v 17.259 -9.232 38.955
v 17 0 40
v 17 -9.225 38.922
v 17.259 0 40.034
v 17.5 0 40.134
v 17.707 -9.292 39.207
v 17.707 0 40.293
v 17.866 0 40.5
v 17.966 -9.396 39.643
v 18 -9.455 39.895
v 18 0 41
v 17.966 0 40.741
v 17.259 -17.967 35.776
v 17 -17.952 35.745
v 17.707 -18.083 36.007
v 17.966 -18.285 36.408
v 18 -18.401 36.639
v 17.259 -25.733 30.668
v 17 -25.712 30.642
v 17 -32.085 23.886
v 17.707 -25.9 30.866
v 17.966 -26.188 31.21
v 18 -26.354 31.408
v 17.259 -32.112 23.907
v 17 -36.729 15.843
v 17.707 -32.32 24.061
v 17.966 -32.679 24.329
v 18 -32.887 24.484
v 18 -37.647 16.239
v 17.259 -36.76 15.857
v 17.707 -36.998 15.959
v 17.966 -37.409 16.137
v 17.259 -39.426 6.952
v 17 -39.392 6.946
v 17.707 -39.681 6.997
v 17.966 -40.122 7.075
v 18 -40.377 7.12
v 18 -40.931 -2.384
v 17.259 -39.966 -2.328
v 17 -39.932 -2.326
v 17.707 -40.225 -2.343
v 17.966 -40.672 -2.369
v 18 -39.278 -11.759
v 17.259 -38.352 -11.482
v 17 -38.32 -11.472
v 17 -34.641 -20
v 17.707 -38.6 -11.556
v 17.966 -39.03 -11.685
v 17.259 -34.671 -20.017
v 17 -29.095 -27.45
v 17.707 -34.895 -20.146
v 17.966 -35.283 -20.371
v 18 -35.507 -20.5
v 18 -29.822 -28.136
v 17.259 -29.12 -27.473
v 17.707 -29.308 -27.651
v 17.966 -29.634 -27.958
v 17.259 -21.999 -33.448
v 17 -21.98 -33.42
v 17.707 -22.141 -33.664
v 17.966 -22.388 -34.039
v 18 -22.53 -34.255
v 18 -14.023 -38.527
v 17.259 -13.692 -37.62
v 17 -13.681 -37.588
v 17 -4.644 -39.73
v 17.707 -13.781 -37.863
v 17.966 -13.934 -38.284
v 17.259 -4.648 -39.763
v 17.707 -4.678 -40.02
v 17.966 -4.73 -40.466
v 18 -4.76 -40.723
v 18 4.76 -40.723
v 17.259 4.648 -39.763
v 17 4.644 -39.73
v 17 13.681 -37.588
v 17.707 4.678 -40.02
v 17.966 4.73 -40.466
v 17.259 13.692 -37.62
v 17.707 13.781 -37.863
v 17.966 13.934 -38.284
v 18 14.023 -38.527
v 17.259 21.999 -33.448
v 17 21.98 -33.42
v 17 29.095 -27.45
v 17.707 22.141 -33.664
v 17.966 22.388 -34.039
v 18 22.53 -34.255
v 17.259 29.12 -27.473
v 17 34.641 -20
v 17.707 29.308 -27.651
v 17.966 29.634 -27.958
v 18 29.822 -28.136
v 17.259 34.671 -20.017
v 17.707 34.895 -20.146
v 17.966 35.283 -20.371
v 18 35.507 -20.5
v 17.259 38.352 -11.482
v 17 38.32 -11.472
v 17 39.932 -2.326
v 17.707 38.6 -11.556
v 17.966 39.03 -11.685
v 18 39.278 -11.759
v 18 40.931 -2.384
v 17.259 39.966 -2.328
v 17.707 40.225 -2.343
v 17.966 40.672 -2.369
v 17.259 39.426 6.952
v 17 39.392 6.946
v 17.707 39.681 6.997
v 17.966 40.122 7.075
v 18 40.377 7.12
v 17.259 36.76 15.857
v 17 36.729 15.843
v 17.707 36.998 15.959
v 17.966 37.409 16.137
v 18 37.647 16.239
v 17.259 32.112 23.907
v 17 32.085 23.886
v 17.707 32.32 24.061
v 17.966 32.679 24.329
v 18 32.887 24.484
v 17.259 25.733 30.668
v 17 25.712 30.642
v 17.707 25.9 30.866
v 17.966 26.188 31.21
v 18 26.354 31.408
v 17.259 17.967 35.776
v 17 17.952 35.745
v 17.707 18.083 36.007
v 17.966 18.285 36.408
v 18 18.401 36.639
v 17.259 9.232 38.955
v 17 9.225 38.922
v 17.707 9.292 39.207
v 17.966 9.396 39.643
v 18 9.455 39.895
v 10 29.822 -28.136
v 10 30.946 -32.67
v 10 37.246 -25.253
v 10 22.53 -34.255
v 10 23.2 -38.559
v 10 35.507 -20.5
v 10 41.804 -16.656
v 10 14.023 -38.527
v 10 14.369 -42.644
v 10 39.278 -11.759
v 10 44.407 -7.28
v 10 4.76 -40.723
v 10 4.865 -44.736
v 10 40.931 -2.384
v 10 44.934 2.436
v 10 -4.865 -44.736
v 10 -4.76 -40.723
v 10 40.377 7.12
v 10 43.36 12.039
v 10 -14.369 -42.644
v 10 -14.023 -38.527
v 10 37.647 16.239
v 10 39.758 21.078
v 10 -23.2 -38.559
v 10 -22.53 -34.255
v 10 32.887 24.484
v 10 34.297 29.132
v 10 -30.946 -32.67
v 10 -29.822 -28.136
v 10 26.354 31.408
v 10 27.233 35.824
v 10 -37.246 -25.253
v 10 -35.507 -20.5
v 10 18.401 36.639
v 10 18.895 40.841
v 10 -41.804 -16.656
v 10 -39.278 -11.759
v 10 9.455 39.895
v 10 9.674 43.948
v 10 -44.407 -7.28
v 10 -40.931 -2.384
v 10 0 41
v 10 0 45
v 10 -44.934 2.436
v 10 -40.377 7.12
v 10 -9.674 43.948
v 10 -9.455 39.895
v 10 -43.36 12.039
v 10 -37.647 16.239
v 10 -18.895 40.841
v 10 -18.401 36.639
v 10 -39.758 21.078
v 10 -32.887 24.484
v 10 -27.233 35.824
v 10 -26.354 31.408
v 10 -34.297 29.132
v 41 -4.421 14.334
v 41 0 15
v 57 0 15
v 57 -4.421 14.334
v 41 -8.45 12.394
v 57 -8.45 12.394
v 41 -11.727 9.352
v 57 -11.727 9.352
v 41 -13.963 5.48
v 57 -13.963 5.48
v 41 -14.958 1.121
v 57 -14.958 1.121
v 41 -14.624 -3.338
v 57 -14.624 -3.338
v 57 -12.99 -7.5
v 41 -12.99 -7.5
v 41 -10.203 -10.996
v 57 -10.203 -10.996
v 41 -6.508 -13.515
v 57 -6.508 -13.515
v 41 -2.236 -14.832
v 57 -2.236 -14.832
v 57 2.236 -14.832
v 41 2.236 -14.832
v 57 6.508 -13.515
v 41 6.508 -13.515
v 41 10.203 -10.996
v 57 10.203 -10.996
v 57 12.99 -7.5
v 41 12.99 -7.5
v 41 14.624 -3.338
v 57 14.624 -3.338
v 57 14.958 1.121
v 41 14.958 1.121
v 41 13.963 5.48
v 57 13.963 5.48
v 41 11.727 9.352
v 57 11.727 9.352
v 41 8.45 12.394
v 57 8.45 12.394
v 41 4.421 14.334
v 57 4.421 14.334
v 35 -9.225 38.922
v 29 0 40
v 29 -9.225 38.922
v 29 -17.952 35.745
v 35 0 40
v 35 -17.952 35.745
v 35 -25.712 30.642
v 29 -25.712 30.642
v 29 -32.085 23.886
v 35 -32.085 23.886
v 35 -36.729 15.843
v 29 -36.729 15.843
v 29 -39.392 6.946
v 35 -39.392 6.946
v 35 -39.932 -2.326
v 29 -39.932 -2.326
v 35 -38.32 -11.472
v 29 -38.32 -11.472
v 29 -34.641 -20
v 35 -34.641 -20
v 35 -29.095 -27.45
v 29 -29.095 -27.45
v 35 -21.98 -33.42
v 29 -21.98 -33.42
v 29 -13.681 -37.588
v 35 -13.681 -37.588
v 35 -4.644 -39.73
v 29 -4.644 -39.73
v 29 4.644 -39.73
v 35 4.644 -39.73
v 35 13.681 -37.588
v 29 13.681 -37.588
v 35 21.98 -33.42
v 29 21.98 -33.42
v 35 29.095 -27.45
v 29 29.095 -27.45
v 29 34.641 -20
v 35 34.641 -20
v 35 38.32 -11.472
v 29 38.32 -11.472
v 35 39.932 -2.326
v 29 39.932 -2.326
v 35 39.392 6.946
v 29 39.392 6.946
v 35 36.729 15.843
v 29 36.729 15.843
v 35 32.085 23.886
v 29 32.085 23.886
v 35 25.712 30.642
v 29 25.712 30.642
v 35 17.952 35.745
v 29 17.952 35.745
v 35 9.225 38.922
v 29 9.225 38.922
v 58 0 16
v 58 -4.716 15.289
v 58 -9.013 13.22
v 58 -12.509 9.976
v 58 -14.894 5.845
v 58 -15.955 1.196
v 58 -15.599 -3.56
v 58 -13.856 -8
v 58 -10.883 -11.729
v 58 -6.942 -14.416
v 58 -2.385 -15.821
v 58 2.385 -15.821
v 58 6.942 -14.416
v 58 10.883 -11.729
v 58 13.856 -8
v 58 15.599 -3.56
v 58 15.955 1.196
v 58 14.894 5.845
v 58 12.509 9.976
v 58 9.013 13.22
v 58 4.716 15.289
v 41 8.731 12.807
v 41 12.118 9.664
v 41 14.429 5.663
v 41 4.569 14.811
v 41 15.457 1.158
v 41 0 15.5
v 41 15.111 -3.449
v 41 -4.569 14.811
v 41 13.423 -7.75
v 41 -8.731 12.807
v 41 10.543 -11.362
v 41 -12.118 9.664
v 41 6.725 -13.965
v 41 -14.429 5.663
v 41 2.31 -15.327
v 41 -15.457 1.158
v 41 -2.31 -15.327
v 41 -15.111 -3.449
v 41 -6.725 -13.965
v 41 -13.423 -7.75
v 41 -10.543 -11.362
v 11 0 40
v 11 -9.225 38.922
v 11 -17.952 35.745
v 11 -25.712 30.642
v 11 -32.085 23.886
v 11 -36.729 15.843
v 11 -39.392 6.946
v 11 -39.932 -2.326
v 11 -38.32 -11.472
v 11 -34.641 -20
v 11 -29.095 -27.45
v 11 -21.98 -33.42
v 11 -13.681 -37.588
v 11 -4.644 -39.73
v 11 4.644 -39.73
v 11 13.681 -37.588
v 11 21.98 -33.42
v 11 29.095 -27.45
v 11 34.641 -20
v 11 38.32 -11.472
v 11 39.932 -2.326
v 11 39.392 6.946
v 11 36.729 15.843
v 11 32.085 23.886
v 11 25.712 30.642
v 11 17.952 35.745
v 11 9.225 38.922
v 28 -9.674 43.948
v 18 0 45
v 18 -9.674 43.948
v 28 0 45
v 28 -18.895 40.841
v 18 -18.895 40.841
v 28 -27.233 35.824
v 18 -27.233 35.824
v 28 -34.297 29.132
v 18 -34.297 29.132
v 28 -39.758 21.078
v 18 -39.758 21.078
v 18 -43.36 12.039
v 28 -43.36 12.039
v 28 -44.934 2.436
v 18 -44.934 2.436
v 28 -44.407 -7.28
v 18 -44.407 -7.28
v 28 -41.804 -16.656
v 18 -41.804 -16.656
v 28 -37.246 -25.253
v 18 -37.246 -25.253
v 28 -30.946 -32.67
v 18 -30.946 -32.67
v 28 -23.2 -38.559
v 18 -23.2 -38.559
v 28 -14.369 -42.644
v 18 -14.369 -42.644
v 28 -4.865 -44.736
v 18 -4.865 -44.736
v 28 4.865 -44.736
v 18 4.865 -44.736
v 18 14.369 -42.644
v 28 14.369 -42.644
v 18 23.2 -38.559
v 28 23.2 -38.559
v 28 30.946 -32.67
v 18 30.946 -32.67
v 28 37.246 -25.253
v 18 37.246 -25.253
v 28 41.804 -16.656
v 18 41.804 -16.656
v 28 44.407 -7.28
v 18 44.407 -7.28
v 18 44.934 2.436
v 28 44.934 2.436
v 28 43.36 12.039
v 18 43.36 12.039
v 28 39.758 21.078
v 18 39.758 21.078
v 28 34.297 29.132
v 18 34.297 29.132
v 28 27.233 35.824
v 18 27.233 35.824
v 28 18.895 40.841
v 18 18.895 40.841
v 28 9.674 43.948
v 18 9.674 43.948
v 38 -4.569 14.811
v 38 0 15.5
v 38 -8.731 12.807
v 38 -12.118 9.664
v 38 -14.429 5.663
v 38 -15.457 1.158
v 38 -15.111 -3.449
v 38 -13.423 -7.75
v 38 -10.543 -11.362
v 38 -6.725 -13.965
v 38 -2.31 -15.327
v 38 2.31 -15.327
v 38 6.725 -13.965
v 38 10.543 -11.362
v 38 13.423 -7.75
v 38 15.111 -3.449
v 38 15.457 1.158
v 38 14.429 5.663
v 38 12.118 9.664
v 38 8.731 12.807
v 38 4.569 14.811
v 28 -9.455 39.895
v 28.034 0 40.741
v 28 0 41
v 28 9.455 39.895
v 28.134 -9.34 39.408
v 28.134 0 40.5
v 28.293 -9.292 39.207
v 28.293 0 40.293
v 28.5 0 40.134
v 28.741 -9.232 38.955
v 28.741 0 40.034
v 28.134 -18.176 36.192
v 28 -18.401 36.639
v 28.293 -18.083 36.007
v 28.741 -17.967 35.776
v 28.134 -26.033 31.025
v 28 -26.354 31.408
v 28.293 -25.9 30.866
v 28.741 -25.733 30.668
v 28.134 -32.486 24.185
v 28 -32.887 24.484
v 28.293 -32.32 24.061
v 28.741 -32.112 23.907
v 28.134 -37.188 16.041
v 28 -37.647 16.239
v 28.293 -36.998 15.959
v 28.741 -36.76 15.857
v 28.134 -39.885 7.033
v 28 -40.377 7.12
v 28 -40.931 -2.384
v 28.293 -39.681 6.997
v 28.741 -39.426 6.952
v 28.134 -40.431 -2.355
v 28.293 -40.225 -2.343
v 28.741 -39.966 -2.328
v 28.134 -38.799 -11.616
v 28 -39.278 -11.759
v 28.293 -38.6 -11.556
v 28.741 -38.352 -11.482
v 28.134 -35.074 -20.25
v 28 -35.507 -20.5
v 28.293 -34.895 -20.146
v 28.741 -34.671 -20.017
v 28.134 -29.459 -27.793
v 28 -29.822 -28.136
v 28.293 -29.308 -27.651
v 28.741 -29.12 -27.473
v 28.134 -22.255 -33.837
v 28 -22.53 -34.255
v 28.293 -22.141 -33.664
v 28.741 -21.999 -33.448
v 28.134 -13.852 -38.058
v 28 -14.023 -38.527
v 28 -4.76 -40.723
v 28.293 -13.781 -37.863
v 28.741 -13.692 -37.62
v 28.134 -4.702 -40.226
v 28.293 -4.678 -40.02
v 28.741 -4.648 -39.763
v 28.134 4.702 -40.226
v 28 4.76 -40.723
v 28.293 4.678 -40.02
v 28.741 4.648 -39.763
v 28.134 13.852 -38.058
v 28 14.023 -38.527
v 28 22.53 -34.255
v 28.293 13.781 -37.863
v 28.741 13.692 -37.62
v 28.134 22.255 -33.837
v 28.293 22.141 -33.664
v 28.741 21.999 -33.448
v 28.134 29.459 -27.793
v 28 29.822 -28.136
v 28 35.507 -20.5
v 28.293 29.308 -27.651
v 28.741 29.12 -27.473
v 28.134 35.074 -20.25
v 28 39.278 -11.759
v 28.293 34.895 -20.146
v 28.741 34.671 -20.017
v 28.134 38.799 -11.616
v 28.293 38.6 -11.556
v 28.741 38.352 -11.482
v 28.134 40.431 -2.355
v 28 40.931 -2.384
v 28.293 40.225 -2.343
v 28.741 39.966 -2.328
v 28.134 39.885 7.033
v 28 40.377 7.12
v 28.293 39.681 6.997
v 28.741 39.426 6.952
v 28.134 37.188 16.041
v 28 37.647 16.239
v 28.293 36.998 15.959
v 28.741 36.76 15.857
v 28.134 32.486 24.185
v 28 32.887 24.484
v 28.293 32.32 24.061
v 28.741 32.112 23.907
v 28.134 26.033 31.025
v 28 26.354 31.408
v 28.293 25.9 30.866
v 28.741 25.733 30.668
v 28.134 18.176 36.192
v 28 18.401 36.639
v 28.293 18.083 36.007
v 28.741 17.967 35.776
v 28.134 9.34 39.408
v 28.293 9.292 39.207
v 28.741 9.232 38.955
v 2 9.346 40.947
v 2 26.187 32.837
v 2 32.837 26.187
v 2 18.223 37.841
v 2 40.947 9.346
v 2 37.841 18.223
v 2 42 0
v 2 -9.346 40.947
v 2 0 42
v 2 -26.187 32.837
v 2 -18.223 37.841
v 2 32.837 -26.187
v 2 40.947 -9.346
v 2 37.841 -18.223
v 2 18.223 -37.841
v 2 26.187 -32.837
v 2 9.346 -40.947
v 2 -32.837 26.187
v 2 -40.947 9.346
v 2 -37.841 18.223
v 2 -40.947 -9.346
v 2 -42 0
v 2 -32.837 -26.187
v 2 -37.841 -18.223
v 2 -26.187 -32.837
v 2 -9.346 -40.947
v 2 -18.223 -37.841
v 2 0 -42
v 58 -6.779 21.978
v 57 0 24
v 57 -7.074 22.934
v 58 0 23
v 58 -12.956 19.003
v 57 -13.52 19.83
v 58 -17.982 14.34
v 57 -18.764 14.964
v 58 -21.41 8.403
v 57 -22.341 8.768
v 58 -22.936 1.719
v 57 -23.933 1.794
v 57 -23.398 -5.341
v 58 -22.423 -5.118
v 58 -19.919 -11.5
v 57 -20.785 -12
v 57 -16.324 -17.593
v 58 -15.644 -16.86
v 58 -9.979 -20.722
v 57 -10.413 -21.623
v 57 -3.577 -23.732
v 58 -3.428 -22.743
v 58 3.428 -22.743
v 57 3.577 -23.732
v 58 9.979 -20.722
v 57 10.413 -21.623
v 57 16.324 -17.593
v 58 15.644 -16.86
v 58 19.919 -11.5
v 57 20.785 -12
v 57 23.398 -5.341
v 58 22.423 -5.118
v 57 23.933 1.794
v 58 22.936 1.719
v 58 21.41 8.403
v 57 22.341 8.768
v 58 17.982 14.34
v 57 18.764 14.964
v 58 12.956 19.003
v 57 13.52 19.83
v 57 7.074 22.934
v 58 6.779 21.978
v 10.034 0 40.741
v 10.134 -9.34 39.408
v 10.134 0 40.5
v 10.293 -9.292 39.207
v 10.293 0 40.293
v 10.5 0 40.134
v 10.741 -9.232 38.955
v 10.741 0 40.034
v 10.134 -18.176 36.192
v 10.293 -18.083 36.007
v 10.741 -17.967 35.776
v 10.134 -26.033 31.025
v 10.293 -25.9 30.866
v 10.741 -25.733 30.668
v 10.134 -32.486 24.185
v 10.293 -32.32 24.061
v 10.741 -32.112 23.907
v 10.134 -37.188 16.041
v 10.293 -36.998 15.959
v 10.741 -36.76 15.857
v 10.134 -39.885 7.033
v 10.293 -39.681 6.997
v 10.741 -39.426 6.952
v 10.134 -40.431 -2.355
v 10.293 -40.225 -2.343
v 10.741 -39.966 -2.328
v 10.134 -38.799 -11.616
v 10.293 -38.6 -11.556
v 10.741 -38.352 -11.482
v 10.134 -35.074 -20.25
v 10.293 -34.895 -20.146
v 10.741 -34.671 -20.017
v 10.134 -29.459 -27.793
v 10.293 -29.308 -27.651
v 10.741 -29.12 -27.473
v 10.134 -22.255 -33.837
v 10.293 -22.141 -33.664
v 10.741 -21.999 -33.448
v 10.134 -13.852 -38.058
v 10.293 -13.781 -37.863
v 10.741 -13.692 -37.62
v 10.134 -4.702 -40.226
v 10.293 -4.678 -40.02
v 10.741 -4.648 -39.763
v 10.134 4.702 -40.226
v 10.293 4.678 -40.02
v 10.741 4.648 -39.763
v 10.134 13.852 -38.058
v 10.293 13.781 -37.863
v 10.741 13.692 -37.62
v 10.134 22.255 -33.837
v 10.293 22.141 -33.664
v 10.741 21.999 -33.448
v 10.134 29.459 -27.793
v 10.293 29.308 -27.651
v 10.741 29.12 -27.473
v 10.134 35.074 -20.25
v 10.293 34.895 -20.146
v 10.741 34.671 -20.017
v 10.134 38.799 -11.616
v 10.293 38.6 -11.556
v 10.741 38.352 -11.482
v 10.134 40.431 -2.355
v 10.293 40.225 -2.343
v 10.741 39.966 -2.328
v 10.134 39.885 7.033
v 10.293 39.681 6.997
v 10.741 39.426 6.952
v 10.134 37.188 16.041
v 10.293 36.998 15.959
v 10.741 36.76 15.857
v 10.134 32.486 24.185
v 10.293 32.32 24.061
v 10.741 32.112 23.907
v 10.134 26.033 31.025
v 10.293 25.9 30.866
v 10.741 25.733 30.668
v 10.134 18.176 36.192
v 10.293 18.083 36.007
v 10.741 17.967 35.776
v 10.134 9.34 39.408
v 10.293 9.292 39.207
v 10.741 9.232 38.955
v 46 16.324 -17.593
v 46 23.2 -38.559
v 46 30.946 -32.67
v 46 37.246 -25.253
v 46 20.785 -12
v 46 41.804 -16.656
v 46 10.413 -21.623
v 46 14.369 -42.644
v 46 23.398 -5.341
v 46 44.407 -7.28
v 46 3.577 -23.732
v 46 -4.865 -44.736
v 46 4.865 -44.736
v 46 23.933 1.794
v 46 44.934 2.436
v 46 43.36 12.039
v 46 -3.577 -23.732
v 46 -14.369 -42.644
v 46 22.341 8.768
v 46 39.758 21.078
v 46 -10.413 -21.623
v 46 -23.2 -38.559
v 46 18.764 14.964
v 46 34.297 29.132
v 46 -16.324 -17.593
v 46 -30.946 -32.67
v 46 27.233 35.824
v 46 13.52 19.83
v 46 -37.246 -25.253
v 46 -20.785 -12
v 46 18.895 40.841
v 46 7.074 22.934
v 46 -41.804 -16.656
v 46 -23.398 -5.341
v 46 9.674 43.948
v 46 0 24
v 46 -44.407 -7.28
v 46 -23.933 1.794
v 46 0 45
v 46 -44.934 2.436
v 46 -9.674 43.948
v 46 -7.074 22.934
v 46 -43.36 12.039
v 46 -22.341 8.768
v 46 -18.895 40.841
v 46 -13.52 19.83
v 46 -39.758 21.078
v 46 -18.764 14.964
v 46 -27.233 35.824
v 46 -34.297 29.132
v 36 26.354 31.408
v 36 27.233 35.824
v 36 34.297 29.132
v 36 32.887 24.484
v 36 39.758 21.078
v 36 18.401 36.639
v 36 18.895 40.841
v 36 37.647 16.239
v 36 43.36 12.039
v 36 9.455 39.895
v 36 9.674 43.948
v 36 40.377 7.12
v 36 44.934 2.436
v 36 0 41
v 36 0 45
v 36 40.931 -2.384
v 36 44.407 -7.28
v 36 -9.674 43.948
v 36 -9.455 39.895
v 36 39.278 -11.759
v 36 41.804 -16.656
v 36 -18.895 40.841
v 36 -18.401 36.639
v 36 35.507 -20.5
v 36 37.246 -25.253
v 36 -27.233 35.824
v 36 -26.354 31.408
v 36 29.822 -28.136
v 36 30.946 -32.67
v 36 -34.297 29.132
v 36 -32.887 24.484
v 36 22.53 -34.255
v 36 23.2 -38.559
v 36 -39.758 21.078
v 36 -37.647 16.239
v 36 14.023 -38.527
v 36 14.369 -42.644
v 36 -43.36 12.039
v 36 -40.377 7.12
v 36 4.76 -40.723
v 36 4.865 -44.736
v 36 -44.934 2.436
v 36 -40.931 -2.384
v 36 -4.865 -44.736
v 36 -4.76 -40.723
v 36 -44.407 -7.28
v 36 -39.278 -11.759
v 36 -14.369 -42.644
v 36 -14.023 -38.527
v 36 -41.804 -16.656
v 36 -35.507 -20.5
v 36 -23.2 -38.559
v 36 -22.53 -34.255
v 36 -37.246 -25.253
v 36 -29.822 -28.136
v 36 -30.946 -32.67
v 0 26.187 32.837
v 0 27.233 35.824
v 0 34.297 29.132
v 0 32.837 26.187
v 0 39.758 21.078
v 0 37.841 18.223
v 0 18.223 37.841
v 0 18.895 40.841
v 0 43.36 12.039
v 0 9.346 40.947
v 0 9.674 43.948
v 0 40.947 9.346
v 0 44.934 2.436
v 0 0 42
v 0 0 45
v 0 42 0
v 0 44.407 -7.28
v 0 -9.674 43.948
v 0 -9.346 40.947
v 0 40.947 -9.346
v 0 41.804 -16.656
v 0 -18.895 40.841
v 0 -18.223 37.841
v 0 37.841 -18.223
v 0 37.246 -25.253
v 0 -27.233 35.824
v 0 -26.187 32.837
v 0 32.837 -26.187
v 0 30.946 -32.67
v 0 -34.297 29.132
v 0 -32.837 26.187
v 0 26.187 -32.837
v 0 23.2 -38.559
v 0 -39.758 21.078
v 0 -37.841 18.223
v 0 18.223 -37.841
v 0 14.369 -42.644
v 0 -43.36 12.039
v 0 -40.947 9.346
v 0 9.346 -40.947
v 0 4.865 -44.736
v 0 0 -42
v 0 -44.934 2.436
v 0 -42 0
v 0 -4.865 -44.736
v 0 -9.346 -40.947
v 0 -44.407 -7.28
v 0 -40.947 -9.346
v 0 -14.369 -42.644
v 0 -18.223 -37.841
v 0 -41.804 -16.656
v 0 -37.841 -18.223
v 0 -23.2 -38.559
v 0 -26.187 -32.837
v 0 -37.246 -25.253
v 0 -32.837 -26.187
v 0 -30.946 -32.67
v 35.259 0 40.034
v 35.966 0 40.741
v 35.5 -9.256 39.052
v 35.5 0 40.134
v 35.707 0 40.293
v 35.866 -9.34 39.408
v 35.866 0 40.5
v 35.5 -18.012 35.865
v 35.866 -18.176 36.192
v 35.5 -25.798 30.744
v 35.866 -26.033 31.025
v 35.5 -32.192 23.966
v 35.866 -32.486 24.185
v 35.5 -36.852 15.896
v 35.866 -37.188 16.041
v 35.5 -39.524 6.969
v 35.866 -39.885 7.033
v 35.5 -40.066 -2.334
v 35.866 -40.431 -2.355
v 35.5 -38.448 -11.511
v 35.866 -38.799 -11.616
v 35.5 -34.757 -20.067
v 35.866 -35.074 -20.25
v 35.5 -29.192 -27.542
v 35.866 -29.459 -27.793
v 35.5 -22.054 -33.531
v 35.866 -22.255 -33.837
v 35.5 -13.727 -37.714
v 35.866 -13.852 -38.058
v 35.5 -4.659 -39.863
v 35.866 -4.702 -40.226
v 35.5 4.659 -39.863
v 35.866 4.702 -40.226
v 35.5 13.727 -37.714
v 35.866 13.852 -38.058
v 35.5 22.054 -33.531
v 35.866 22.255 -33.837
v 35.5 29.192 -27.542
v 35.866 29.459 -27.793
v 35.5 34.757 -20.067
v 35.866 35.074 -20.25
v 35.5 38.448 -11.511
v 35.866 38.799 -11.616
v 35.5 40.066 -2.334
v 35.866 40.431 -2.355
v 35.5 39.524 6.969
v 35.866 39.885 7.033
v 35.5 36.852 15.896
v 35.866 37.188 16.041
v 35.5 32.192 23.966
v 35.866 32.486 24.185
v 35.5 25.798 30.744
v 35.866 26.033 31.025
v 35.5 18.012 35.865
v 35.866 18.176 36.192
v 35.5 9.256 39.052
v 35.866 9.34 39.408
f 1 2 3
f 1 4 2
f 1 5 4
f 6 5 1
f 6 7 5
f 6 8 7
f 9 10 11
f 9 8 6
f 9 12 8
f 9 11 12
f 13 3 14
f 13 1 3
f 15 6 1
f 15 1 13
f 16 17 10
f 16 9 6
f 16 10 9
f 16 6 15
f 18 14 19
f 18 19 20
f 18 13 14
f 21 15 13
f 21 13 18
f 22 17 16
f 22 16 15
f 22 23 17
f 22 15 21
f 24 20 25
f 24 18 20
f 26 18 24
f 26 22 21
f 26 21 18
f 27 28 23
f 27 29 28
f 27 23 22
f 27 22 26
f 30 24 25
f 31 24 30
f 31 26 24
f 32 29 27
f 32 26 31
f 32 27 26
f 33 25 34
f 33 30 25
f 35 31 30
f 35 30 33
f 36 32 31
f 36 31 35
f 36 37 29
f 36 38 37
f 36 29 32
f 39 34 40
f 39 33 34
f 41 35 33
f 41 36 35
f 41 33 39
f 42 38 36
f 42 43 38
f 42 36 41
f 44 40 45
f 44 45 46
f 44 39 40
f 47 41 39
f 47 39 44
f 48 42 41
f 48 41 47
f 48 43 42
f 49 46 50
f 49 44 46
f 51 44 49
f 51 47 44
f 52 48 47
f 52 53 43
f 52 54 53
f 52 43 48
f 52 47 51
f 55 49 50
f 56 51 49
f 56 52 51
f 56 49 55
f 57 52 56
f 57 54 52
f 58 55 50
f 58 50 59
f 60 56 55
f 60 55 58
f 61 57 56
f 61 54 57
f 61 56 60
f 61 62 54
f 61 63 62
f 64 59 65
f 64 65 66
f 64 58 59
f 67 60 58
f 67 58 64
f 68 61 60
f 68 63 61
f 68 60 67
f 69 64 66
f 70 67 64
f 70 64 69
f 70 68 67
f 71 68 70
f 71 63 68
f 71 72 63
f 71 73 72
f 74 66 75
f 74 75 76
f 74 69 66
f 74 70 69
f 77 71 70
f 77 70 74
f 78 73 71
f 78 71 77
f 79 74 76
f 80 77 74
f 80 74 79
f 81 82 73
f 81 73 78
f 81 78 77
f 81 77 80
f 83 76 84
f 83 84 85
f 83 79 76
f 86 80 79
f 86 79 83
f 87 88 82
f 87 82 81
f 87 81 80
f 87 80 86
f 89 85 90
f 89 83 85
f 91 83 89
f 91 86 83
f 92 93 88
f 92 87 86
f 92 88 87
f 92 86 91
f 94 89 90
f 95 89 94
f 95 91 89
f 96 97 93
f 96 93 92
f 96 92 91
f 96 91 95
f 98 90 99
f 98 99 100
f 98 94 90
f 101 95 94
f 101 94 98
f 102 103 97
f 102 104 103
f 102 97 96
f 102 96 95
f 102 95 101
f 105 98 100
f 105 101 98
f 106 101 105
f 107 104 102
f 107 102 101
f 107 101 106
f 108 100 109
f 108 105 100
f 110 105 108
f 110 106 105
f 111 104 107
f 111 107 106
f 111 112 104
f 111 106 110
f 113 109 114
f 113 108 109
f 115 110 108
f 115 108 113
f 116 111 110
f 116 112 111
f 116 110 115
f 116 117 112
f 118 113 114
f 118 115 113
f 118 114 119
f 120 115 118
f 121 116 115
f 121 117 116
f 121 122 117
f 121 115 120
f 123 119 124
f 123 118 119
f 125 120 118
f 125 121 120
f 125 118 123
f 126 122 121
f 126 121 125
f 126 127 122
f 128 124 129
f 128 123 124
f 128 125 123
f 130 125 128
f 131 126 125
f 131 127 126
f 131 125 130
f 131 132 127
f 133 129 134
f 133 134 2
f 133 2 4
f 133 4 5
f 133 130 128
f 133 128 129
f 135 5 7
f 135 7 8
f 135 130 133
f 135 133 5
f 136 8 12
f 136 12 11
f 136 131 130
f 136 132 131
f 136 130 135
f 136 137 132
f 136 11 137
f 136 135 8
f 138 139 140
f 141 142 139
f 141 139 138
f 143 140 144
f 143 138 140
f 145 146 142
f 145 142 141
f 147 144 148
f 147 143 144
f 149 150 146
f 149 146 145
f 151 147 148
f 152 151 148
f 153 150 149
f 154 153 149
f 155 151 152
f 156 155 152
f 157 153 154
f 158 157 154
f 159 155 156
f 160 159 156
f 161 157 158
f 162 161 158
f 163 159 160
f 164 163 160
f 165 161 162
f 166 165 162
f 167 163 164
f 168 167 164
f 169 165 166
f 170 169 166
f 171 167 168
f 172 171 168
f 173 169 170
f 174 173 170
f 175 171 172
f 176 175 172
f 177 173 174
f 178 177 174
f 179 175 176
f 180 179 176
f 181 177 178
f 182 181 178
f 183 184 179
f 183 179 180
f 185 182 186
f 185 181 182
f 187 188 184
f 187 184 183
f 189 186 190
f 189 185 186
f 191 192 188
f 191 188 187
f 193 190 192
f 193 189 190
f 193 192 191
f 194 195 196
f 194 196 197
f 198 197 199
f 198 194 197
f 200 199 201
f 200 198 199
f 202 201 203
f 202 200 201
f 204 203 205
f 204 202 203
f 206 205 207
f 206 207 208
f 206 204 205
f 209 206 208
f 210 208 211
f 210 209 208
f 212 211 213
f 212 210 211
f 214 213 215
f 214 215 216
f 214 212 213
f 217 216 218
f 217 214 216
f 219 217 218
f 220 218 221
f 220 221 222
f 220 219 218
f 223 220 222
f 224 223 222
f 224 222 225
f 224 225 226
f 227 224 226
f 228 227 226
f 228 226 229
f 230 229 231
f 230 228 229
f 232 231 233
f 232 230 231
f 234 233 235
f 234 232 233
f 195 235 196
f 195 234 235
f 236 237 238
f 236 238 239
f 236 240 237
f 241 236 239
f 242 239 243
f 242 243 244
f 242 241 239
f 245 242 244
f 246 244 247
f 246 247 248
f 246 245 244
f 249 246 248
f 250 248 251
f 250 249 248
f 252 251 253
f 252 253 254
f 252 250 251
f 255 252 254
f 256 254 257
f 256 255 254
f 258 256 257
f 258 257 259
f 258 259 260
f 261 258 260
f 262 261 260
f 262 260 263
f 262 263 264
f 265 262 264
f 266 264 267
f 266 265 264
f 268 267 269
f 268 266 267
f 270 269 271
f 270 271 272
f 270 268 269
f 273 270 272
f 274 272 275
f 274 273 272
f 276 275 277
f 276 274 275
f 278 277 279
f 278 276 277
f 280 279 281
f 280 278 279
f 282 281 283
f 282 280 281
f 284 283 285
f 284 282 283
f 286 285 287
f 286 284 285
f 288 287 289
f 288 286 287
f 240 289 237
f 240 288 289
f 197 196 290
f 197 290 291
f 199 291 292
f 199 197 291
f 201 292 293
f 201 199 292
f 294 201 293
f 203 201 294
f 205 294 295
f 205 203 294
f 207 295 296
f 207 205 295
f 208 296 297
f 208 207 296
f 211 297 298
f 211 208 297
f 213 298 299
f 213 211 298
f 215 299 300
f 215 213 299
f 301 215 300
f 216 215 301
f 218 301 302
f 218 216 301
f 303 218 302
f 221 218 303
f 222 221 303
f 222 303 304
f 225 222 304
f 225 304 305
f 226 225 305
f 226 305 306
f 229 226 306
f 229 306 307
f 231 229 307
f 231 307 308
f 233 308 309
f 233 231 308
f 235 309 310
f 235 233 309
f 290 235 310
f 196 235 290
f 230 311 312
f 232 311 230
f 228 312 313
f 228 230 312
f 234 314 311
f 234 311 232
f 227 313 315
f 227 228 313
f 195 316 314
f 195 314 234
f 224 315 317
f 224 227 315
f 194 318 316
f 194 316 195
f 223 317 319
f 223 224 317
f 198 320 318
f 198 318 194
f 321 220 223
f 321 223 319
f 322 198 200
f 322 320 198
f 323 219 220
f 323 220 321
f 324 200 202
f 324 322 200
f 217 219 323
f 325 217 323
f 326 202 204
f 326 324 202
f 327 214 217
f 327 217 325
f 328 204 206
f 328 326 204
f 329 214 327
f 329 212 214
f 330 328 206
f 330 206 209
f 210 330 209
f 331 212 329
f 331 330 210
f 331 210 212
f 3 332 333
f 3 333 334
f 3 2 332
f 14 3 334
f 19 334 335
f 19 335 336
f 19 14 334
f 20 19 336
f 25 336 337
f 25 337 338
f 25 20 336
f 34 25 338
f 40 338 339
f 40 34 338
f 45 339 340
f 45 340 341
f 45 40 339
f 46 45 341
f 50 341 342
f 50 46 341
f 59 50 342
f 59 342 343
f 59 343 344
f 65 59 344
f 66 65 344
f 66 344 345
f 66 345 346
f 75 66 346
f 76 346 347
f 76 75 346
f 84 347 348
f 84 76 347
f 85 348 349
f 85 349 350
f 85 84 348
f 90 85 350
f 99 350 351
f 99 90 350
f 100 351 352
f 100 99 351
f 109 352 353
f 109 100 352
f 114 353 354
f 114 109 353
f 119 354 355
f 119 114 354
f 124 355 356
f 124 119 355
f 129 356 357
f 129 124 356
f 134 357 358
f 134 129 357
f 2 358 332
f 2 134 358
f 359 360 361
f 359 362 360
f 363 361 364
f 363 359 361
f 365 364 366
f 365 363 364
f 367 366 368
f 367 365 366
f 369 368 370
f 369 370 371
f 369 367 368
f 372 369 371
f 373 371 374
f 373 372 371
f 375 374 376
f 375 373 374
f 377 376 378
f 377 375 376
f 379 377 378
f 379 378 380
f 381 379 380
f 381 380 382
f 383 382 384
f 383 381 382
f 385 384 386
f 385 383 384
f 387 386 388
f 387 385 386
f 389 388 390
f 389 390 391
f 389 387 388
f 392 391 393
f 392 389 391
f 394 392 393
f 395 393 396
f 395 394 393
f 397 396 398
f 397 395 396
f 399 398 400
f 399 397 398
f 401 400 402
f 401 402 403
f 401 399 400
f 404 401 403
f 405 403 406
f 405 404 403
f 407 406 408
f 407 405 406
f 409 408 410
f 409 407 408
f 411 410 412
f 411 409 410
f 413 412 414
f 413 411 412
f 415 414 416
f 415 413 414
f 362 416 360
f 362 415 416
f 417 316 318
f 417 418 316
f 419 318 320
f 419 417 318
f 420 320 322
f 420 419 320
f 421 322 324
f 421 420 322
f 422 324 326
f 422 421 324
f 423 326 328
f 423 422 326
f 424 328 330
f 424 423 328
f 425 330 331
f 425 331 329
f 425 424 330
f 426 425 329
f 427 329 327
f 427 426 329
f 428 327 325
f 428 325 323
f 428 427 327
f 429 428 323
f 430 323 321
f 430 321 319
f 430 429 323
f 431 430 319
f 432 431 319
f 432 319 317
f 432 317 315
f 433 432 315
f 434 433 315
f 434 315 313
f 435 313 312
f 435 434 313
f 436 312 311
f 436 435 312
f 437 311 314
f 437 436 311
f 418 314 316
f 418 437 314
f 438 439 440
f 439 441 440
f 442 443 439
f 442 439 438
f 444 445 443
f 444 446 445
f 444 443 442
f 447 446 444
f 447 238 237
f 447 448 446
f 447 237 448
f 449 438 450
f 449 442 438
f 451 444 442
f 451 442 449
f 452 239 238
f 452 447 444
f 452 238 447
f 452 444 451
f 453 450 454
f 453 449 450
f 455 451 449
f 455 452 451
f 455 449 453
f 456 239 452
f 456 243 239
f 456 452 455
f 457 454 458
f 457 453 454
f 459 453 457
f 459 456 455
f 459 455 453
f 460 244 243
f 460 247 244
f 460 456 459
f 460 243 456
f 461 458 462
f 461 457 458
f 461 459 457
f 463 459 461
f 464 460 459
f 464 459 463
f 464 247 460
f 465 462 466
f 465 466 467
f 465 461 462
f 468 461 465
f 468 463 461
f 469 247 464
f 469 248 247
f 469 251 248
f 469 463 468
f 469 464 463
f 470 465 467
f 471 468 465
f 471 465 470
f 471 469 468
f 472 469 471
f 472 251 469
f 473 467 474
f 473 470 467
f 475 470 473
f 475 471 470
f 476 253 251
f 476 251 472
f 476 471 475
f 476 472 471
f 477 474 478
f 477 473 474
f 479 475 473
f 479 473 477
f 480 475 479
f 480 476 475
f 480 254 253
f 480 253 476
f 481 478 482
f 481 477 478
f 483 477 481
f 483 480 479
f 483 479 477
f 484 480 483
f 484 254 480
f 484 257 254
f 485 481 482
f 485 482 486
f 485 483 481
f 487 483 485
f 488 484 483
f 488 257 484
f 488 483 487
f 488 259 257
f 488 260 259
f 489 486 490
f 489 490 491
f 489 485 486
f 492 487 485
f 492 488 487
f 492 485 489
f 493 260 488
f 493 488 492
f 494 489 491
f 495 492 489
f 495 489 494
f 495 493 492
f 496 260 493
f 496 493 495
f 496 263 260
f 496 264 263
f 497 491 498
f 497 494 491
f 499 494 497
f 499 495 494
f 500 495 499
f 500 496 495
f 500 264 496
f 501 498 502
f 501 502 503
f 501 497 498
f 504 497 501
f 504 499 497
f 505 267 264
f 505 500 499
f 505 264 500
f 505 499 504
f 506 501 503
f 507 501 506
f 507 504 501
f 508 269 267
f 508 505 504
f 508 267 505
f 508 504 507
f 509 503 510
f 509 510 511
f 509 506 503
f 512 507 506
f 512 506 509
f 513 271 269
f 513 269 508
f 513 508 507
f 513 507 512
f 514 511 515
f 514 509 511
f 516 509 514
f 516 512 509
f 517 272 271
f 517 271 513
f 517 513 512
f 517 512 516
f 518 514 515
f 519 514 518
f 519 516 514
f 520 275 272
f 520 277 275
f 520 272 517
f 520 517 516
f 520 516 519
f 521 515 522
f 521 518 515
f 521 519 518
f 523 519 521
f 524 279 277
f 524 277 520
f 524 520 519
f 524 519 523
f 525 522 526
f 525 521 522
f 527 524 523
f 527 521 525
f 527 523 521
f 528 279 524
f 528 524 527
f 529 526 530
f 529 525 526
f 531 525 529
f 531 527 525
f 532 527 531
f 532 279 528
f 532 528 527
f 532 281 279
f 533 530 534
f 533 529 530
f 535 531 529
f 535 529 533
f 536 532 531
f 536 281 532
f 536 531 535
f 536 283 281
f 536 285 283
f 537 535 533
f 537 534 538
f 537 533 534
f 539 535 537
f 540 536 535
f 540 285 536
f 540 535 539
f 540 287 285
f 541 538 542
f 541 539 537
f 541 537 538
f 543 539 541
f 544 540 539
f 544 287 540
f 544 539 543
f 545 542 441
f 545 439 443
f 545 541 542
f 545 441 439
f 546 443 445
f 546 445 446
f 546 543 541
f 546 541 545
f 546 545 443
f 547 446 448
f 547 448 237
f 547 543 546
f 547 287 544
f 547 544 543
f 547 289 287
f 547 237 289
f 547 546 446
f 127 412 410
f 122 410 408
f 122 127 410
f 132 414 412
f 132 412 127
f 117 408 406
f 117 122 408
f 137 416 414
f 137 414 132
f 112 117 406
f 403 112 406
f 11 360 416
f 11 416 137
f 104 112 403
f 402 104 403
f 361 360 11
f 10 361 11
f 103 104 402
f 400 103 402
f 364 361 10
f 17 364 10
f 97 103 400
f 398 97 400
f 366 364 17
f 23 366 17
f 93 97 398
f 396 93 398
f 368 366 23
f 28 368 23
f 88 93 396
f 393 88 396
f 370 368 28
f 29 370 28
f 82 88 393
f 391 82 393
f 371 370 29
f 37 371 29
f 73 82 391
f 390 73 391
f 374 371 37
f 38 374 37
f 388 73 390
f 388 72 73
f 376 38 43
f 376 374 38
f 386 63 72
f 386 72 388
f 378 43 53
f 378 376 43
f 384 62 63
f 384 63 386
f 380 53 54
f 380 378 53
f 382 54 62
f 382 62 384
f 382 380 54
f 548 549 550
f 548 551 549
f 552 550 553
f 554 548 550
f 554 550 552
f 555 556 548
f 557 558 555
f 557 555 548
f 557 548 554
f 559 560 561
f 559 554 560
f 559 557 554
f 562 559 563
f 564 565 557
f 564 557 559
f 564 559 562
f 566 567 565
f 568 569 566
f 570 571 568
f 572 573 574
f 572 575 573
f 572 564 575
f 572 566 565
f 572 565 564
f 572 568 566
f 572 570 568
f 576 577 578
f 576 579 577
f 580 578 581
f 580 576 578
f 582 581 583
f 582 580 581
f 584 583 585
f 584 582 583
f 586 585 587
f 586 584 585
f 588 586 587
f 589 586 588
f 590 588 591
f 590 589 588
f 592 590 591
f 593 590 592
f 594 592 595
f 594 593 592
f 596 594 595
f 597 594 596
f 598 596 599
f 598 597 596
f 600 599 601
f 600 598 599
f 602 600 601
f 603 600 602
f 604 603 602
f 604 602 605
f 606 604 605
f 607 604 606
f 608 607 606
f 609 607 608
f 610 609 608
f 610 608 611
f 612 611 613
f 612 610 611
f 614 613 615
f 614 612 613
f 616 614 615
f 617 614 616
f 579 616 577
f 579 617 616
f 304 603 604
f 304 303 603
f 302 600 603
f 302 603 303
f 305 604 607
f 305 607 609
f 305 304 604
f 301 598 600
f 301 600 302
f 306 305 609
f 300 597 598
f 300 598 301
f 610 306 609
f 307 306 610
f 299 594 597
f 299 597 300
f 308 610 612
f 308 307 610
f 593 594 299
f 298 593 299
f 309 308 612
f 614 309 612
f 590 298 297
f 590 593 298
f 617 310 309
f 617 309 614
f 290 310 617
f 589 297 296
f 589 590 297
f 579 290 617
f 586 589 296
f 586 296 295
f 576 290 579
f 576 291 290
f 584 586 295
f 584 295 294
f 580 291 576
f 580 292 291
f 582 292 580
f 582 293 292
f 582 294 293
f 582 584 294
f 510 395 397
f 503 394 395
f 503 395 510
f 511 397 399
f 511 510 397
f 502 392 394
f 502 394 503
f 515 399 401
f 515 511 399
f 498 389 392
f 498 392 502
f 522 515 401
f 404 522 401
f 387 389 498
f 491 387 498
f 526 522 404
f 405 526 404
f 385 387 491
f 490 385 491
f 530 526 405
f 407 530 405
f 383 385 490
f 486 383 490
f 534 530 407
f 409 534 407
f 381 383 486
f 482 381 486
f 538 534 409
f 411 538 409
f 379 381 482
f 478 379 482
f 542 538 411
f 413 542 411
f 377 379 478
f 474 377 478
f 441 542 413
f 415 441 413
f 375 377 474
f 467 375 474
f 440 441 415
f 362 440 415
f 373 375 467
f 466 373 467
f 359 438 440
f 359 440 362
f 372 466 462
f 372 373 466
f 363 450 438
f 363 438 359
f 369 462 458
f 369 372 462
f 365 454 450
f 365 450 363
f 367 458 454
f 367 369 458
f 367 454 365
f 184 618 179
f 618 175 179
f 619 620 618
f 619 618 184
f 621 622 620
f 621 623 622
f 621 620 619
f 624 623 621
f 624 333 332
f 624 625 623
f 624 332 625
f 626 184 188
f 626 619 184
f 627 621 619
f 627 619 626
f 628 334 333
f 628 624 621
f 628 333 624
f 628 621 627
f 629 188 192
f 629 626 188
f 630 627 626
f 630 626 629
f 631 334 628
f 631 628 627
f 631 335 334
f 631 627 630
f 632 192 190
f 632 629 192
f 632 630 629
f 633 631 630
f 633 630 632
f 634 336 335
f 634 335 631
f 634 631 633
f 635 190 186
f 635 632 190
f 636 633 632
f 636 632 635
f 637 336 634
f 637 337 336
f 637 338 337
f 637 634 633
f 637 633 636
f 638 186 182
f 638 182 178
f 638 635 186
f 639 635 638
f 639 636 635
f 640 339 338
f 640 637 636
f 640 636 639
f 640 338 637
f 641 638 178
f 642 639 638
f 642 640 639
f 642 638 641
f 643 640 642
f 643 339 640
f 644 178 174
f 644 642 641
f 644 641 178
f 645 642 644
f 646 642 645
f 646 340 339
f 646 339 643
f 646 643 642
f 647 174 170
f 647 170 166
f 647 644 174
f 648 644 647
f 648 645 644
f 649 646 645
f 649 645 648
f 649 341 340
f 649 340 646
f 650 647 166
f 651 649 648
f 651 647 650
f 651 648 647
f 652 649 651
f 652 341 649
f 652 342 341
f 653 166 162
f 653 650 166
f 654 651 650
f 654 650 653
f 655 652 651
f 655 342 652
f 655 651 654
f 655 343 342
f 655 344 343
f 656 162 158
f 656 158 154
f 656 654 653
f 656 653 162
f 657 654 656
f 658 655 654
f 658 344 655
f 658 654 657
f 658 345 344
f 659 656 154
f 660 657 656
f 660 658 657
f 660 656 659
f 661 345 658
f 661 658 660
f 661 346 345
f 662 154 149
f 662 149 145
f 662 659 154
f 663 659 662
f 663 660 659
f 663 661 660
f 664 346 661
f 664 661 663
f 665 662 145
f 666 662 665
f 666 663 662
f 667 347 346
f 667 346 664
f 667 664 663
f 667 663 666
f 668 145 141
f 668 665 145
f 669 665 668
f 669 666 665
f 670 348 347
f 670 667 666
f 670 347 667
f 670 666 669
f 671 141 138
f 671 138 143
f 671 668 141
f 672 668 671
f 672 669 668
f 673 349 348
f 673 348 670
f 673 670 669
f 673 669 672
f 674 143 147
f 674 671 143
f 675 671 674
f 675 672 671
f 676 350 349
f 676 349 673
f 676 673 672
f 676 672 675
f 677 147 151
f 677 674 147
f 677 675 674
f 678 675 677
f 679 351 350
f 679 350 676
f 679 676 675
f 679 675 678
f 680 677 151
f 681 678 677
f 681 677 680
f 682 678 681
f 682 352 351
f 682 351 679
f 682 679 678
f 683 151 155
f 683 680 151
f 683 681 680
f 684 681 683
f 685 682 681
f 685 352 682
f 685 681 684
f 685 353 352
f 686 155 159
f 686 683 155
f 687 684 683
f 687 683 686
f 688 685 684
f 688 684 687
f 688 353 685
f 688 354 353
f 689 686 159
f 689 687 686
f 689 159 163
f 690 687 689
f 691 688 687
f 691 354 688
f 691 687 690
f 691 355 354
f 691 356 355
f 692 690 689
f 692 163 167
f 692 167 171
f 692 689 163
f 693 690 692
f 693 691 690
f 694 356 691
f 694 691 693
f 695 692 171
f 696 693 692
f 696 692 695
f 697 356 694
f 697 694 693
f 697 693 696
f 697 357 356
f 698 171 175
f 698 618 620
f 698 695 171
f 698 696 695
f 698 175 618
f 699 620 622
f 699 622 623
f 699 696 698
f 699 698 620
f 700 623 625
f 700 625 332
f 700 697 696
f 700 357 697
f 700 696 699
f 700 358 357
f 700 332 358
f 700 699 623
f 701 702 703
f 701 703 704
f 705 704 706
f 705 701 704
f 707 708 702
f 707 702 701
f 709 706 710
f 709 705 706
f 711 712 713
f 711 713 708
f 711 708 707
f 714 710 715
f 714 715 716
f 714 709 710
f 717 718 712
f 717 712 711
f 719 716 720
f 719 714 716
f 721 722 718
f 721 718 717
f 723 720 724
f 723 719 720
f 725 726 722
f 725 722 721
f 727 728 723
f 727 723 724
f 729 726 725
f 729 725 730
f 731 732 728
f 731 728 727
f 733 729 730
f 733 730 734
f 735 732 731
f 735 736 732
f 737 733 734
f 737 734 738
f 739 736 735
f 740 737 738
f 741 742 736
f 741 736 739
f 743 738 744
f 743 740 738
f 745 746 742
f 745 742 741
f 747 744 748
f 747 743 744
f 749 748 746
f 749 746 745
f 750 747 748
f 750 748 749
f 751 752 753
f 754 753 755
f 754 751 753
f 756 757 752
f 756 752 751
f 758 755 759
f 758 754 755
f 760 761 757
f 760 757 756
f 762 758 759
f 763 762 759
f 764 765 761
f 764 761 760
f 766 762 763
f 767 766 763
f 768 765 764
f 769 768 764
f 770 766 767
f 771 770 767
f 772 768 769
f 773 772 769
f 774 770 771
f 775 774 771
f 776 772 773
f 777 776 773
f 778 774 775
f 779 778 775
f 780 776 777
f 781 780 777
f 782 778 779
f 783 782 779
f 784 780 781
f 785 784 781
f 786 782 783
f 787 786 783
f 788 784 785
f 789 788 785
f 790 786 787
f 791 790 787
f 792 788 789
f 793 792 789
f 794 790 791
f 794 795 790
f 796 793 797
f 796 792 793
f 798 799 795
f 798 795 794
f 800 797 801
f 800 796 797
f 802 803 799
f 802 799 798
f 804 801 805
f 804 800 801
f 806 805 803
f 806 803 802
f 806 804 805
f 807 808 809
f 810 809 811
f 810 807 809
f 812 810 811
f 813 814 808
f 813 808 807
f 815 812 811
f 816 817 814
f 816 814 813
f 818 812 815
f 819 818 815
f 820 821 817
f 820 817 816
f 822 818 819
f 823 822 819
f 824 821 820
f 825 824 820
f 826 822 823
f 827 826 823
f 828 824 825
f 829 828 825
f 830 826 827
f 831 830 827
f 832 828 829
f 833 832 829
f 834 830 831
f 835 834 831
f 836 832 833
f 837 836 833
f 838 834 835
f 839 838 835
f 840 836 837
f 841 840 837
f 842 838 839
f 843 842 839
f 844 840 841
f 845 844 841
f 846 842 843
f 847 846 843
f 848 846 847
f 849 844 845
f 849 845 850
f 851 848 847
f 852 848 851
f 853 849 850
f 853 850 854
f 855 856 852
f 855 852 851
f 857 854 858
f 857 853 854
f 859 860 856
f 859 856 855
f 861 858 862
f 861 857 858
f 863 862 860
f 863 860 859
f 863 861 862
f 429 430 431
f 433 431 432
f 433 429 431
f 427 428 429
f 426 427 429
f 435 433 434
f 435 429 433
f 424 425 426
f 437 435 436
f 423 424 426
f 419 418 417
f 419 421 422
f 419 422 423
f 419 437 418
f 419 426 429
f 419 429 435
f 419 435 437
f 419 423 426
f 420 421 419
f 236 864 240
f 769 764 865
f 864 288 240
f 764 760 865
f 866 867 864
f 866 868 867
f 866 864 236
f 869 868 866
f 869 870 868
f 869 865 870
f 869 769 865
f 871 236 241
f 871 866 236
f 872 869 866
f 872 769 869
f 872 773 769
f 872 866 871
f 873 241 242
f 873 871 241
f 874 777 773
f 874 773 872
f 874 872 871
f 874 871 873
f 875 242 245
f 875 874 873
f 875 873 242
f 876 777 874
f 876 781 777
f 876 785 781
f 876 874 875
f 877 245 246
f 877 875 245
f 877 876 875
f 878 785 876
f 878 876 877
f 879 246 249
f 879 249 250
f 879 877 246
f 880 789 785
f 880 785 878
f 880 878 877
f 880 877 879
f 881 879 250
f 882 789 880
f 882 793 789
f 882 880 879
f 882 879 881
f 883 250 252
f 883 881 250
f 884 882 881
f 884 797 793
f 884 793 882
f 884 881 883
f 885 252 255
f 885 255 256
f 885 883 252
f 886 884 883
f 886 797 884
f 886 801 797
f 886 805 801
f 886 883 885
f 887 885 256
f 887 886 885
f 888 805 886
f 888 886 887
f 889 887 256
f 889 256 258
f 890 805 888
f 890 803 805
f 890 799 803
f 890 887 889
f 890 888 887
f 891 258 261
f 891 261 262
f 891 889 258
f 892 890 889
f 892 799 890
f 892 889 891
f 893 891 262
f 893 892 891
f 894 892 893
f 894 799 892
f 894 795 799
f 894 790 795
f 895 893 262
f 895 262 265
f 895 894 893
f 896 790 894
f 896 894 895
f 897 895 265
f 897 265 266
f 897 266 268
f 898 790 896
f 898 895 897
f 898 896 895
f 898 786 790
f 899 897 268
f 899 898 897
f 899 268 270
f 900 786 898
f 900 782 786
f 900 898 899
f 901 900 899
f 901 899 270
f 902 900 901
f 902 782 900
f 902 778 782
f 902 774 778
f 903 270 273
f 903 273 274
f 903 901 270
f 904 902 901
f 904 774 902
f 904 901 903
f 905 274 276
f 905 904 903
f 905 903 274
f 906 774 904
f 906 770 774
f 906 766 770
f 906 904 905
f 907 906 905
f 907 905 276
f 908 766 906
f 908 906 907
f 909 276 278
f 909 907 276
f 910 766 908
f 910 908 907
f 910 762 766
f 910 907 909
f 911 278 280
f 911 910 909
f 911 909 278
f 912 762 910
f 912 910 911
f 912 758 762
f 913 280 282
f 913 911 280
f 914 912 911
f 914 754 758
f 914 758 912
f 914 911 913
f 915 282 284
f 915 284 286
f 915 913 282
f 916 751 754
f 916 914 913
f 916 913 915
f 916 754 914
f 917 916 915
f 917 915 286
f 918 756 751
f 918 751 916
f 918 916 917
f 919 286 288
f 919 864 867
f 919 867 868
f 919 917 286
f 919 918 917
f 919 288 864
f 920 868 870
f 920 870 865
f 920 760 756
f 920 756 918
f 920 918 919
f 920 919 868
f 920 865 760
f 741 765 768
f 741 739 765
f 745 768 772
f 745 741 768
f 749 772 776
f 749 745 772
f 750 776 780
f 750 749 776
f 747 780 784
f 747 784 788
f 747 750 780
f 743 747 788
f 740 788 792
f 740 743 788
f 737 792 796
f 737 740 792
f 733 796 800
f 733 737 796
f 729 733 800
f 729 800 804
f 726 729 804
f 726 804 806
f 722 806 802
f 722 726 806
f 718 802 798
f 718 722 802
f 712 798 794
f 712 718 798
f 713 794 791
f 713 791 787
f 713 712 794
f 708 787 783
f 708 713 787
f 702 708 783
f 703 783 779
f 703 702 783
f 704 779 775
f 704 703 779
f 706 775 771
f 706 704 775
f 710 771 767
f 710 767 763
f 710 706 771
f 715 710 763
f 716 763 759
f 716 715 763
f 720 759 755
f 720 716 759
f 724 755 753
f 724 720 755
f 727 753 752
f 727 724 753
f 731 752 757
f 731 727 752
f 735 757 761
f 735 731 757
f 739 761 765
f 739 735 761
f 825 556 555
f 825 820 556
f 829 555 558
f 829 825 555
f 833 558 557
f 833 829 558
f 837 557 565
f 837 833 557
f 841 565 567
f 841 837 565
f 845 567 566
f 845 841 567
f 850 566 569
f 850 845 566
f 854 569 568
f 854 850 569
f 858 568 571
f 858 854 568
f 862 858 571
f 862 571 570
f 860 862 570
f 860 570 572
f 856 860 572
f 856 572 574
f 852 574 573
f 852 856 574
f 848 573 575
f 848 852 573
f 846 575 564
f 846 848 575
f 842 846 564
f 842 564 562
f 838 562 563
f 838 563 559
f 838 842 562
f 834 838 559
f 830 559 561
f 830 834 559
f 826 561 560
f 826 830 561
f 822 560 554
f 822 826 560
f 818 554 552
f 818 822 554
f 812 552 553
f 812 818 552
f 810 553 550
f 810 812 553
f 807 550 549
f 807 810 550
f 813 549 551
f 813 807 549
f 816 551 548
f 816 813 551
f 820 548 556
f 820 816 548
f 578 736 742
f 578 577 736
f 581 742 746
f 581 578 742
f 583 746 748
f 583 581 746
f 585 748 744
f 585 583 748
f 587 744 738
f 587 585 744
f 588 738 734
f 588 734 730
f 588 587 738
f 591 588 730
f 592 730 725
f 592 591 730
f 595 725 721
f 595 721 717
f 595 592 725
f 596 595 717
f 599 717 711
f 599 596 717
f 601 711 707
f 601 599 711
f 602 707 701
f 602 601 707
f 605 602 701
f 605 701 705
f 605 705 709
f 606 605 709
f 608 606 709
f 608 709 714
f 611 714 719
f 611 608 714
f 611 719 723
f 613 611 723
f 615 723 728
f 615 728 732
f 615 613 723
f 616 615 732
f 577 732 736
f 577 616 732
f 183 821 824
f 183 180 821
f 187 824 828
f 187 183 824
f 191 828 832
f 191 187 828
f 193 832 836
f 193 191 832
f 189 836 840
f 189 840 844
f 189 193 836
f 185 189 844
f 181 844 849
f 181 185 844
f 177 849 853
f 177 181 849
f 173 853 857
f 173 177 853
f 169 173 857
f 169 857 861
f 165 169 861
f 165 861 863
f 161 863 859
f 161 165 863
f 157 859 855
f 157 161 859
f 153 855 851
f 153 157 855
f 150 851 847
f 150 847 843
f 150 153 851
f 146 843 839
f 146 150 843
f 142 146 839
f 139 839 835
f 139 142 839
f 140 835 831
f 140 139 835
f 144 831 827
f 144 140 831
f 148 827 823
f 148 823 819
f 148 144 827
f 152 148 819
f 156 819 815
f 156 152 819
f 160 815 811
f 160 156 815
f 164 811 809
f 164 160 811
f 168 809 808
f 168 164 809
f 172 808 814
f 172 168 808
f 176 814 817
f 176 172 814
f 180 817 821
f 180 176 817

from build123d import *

# Parameters (mm, degrees)
CHAMFER_1_SIZE = 1


with BuildPart() as part:
    # Эскиз1 → Повернуть1 (revolve)
    with BuildSketch(Plane.XY, mode=Mode.PRIVATE) as revolve_1_sk:
        with BuildLine():
            Line((0, 42), (0, 45))
            Line((0, 45), (10, 45))
            Line((10, 45), (10, 41))
            ThreePointArc((10, 41), (10.292893219, 40.292893219), (11, 40))
            Line((11, 40), (17, 40))
            ThreePointArc((17, 40), (17.707106781, 40.292893219), (18, 41))
            Line((18, 41), (18, 45))
            Line((18, 45), (28, 45))
            Line((28, 45), (28, 41))
            ThreePointArc((28, 41), (28.292893219, 40.292893219), (29, 40))
            Line((29, 40), (35, 40))
            ThreePointArc((35, 40), (35.707106781, 40.292893219), (36, 41))
            Line((36, 41), (36, 45))
            Line((36, 45), (46, 45))
            Line((46, 45), (46, 24))
            Line((46, 24), (57, 24))
            Line((57, 24), (58, 23))
            Line((58, 23), (58, 0))
            Line((58, 0), (2, 0))
            Line((2, 0), (2, 42))
            Line((2, 42), (0, 42))
        make_face()
    revolve(revolve_1_sk.sketch.rotate(Axis((2, 0, 0), (1, 0, 0)), 90), axis=Axis((2, 0, 0), (1, 0, 0)))

    # Эскиз2 → Вырез-Повернуть1 (revolve, cut)
    with BuildSketch(Plane.XY, mode=Mode.PRIVATE) as cut_revolve_1_sk:
        Polygon((58, 0), (58, 15), (41, 15), (41, 15.5), (38, 15.5), (38, 0), align=None)
    revolve(cut_revolve_1_sk.sketch.rotate(Axis((0, 0, 0), (1, 0, 0)), 90), axis=Axis((0, 0, 0), (1, 0, 0)), mode=Mode.SUBTRACT)

    # Фаска1
    chamfer_1_edges = [part.edges().sort_by_distance(p)[0] for p in [
        (58, 0, -15),
    ]]
    chamfer(chamfer_1_edges, length=CHAMFER_1_SIZE)


solid = part.part
